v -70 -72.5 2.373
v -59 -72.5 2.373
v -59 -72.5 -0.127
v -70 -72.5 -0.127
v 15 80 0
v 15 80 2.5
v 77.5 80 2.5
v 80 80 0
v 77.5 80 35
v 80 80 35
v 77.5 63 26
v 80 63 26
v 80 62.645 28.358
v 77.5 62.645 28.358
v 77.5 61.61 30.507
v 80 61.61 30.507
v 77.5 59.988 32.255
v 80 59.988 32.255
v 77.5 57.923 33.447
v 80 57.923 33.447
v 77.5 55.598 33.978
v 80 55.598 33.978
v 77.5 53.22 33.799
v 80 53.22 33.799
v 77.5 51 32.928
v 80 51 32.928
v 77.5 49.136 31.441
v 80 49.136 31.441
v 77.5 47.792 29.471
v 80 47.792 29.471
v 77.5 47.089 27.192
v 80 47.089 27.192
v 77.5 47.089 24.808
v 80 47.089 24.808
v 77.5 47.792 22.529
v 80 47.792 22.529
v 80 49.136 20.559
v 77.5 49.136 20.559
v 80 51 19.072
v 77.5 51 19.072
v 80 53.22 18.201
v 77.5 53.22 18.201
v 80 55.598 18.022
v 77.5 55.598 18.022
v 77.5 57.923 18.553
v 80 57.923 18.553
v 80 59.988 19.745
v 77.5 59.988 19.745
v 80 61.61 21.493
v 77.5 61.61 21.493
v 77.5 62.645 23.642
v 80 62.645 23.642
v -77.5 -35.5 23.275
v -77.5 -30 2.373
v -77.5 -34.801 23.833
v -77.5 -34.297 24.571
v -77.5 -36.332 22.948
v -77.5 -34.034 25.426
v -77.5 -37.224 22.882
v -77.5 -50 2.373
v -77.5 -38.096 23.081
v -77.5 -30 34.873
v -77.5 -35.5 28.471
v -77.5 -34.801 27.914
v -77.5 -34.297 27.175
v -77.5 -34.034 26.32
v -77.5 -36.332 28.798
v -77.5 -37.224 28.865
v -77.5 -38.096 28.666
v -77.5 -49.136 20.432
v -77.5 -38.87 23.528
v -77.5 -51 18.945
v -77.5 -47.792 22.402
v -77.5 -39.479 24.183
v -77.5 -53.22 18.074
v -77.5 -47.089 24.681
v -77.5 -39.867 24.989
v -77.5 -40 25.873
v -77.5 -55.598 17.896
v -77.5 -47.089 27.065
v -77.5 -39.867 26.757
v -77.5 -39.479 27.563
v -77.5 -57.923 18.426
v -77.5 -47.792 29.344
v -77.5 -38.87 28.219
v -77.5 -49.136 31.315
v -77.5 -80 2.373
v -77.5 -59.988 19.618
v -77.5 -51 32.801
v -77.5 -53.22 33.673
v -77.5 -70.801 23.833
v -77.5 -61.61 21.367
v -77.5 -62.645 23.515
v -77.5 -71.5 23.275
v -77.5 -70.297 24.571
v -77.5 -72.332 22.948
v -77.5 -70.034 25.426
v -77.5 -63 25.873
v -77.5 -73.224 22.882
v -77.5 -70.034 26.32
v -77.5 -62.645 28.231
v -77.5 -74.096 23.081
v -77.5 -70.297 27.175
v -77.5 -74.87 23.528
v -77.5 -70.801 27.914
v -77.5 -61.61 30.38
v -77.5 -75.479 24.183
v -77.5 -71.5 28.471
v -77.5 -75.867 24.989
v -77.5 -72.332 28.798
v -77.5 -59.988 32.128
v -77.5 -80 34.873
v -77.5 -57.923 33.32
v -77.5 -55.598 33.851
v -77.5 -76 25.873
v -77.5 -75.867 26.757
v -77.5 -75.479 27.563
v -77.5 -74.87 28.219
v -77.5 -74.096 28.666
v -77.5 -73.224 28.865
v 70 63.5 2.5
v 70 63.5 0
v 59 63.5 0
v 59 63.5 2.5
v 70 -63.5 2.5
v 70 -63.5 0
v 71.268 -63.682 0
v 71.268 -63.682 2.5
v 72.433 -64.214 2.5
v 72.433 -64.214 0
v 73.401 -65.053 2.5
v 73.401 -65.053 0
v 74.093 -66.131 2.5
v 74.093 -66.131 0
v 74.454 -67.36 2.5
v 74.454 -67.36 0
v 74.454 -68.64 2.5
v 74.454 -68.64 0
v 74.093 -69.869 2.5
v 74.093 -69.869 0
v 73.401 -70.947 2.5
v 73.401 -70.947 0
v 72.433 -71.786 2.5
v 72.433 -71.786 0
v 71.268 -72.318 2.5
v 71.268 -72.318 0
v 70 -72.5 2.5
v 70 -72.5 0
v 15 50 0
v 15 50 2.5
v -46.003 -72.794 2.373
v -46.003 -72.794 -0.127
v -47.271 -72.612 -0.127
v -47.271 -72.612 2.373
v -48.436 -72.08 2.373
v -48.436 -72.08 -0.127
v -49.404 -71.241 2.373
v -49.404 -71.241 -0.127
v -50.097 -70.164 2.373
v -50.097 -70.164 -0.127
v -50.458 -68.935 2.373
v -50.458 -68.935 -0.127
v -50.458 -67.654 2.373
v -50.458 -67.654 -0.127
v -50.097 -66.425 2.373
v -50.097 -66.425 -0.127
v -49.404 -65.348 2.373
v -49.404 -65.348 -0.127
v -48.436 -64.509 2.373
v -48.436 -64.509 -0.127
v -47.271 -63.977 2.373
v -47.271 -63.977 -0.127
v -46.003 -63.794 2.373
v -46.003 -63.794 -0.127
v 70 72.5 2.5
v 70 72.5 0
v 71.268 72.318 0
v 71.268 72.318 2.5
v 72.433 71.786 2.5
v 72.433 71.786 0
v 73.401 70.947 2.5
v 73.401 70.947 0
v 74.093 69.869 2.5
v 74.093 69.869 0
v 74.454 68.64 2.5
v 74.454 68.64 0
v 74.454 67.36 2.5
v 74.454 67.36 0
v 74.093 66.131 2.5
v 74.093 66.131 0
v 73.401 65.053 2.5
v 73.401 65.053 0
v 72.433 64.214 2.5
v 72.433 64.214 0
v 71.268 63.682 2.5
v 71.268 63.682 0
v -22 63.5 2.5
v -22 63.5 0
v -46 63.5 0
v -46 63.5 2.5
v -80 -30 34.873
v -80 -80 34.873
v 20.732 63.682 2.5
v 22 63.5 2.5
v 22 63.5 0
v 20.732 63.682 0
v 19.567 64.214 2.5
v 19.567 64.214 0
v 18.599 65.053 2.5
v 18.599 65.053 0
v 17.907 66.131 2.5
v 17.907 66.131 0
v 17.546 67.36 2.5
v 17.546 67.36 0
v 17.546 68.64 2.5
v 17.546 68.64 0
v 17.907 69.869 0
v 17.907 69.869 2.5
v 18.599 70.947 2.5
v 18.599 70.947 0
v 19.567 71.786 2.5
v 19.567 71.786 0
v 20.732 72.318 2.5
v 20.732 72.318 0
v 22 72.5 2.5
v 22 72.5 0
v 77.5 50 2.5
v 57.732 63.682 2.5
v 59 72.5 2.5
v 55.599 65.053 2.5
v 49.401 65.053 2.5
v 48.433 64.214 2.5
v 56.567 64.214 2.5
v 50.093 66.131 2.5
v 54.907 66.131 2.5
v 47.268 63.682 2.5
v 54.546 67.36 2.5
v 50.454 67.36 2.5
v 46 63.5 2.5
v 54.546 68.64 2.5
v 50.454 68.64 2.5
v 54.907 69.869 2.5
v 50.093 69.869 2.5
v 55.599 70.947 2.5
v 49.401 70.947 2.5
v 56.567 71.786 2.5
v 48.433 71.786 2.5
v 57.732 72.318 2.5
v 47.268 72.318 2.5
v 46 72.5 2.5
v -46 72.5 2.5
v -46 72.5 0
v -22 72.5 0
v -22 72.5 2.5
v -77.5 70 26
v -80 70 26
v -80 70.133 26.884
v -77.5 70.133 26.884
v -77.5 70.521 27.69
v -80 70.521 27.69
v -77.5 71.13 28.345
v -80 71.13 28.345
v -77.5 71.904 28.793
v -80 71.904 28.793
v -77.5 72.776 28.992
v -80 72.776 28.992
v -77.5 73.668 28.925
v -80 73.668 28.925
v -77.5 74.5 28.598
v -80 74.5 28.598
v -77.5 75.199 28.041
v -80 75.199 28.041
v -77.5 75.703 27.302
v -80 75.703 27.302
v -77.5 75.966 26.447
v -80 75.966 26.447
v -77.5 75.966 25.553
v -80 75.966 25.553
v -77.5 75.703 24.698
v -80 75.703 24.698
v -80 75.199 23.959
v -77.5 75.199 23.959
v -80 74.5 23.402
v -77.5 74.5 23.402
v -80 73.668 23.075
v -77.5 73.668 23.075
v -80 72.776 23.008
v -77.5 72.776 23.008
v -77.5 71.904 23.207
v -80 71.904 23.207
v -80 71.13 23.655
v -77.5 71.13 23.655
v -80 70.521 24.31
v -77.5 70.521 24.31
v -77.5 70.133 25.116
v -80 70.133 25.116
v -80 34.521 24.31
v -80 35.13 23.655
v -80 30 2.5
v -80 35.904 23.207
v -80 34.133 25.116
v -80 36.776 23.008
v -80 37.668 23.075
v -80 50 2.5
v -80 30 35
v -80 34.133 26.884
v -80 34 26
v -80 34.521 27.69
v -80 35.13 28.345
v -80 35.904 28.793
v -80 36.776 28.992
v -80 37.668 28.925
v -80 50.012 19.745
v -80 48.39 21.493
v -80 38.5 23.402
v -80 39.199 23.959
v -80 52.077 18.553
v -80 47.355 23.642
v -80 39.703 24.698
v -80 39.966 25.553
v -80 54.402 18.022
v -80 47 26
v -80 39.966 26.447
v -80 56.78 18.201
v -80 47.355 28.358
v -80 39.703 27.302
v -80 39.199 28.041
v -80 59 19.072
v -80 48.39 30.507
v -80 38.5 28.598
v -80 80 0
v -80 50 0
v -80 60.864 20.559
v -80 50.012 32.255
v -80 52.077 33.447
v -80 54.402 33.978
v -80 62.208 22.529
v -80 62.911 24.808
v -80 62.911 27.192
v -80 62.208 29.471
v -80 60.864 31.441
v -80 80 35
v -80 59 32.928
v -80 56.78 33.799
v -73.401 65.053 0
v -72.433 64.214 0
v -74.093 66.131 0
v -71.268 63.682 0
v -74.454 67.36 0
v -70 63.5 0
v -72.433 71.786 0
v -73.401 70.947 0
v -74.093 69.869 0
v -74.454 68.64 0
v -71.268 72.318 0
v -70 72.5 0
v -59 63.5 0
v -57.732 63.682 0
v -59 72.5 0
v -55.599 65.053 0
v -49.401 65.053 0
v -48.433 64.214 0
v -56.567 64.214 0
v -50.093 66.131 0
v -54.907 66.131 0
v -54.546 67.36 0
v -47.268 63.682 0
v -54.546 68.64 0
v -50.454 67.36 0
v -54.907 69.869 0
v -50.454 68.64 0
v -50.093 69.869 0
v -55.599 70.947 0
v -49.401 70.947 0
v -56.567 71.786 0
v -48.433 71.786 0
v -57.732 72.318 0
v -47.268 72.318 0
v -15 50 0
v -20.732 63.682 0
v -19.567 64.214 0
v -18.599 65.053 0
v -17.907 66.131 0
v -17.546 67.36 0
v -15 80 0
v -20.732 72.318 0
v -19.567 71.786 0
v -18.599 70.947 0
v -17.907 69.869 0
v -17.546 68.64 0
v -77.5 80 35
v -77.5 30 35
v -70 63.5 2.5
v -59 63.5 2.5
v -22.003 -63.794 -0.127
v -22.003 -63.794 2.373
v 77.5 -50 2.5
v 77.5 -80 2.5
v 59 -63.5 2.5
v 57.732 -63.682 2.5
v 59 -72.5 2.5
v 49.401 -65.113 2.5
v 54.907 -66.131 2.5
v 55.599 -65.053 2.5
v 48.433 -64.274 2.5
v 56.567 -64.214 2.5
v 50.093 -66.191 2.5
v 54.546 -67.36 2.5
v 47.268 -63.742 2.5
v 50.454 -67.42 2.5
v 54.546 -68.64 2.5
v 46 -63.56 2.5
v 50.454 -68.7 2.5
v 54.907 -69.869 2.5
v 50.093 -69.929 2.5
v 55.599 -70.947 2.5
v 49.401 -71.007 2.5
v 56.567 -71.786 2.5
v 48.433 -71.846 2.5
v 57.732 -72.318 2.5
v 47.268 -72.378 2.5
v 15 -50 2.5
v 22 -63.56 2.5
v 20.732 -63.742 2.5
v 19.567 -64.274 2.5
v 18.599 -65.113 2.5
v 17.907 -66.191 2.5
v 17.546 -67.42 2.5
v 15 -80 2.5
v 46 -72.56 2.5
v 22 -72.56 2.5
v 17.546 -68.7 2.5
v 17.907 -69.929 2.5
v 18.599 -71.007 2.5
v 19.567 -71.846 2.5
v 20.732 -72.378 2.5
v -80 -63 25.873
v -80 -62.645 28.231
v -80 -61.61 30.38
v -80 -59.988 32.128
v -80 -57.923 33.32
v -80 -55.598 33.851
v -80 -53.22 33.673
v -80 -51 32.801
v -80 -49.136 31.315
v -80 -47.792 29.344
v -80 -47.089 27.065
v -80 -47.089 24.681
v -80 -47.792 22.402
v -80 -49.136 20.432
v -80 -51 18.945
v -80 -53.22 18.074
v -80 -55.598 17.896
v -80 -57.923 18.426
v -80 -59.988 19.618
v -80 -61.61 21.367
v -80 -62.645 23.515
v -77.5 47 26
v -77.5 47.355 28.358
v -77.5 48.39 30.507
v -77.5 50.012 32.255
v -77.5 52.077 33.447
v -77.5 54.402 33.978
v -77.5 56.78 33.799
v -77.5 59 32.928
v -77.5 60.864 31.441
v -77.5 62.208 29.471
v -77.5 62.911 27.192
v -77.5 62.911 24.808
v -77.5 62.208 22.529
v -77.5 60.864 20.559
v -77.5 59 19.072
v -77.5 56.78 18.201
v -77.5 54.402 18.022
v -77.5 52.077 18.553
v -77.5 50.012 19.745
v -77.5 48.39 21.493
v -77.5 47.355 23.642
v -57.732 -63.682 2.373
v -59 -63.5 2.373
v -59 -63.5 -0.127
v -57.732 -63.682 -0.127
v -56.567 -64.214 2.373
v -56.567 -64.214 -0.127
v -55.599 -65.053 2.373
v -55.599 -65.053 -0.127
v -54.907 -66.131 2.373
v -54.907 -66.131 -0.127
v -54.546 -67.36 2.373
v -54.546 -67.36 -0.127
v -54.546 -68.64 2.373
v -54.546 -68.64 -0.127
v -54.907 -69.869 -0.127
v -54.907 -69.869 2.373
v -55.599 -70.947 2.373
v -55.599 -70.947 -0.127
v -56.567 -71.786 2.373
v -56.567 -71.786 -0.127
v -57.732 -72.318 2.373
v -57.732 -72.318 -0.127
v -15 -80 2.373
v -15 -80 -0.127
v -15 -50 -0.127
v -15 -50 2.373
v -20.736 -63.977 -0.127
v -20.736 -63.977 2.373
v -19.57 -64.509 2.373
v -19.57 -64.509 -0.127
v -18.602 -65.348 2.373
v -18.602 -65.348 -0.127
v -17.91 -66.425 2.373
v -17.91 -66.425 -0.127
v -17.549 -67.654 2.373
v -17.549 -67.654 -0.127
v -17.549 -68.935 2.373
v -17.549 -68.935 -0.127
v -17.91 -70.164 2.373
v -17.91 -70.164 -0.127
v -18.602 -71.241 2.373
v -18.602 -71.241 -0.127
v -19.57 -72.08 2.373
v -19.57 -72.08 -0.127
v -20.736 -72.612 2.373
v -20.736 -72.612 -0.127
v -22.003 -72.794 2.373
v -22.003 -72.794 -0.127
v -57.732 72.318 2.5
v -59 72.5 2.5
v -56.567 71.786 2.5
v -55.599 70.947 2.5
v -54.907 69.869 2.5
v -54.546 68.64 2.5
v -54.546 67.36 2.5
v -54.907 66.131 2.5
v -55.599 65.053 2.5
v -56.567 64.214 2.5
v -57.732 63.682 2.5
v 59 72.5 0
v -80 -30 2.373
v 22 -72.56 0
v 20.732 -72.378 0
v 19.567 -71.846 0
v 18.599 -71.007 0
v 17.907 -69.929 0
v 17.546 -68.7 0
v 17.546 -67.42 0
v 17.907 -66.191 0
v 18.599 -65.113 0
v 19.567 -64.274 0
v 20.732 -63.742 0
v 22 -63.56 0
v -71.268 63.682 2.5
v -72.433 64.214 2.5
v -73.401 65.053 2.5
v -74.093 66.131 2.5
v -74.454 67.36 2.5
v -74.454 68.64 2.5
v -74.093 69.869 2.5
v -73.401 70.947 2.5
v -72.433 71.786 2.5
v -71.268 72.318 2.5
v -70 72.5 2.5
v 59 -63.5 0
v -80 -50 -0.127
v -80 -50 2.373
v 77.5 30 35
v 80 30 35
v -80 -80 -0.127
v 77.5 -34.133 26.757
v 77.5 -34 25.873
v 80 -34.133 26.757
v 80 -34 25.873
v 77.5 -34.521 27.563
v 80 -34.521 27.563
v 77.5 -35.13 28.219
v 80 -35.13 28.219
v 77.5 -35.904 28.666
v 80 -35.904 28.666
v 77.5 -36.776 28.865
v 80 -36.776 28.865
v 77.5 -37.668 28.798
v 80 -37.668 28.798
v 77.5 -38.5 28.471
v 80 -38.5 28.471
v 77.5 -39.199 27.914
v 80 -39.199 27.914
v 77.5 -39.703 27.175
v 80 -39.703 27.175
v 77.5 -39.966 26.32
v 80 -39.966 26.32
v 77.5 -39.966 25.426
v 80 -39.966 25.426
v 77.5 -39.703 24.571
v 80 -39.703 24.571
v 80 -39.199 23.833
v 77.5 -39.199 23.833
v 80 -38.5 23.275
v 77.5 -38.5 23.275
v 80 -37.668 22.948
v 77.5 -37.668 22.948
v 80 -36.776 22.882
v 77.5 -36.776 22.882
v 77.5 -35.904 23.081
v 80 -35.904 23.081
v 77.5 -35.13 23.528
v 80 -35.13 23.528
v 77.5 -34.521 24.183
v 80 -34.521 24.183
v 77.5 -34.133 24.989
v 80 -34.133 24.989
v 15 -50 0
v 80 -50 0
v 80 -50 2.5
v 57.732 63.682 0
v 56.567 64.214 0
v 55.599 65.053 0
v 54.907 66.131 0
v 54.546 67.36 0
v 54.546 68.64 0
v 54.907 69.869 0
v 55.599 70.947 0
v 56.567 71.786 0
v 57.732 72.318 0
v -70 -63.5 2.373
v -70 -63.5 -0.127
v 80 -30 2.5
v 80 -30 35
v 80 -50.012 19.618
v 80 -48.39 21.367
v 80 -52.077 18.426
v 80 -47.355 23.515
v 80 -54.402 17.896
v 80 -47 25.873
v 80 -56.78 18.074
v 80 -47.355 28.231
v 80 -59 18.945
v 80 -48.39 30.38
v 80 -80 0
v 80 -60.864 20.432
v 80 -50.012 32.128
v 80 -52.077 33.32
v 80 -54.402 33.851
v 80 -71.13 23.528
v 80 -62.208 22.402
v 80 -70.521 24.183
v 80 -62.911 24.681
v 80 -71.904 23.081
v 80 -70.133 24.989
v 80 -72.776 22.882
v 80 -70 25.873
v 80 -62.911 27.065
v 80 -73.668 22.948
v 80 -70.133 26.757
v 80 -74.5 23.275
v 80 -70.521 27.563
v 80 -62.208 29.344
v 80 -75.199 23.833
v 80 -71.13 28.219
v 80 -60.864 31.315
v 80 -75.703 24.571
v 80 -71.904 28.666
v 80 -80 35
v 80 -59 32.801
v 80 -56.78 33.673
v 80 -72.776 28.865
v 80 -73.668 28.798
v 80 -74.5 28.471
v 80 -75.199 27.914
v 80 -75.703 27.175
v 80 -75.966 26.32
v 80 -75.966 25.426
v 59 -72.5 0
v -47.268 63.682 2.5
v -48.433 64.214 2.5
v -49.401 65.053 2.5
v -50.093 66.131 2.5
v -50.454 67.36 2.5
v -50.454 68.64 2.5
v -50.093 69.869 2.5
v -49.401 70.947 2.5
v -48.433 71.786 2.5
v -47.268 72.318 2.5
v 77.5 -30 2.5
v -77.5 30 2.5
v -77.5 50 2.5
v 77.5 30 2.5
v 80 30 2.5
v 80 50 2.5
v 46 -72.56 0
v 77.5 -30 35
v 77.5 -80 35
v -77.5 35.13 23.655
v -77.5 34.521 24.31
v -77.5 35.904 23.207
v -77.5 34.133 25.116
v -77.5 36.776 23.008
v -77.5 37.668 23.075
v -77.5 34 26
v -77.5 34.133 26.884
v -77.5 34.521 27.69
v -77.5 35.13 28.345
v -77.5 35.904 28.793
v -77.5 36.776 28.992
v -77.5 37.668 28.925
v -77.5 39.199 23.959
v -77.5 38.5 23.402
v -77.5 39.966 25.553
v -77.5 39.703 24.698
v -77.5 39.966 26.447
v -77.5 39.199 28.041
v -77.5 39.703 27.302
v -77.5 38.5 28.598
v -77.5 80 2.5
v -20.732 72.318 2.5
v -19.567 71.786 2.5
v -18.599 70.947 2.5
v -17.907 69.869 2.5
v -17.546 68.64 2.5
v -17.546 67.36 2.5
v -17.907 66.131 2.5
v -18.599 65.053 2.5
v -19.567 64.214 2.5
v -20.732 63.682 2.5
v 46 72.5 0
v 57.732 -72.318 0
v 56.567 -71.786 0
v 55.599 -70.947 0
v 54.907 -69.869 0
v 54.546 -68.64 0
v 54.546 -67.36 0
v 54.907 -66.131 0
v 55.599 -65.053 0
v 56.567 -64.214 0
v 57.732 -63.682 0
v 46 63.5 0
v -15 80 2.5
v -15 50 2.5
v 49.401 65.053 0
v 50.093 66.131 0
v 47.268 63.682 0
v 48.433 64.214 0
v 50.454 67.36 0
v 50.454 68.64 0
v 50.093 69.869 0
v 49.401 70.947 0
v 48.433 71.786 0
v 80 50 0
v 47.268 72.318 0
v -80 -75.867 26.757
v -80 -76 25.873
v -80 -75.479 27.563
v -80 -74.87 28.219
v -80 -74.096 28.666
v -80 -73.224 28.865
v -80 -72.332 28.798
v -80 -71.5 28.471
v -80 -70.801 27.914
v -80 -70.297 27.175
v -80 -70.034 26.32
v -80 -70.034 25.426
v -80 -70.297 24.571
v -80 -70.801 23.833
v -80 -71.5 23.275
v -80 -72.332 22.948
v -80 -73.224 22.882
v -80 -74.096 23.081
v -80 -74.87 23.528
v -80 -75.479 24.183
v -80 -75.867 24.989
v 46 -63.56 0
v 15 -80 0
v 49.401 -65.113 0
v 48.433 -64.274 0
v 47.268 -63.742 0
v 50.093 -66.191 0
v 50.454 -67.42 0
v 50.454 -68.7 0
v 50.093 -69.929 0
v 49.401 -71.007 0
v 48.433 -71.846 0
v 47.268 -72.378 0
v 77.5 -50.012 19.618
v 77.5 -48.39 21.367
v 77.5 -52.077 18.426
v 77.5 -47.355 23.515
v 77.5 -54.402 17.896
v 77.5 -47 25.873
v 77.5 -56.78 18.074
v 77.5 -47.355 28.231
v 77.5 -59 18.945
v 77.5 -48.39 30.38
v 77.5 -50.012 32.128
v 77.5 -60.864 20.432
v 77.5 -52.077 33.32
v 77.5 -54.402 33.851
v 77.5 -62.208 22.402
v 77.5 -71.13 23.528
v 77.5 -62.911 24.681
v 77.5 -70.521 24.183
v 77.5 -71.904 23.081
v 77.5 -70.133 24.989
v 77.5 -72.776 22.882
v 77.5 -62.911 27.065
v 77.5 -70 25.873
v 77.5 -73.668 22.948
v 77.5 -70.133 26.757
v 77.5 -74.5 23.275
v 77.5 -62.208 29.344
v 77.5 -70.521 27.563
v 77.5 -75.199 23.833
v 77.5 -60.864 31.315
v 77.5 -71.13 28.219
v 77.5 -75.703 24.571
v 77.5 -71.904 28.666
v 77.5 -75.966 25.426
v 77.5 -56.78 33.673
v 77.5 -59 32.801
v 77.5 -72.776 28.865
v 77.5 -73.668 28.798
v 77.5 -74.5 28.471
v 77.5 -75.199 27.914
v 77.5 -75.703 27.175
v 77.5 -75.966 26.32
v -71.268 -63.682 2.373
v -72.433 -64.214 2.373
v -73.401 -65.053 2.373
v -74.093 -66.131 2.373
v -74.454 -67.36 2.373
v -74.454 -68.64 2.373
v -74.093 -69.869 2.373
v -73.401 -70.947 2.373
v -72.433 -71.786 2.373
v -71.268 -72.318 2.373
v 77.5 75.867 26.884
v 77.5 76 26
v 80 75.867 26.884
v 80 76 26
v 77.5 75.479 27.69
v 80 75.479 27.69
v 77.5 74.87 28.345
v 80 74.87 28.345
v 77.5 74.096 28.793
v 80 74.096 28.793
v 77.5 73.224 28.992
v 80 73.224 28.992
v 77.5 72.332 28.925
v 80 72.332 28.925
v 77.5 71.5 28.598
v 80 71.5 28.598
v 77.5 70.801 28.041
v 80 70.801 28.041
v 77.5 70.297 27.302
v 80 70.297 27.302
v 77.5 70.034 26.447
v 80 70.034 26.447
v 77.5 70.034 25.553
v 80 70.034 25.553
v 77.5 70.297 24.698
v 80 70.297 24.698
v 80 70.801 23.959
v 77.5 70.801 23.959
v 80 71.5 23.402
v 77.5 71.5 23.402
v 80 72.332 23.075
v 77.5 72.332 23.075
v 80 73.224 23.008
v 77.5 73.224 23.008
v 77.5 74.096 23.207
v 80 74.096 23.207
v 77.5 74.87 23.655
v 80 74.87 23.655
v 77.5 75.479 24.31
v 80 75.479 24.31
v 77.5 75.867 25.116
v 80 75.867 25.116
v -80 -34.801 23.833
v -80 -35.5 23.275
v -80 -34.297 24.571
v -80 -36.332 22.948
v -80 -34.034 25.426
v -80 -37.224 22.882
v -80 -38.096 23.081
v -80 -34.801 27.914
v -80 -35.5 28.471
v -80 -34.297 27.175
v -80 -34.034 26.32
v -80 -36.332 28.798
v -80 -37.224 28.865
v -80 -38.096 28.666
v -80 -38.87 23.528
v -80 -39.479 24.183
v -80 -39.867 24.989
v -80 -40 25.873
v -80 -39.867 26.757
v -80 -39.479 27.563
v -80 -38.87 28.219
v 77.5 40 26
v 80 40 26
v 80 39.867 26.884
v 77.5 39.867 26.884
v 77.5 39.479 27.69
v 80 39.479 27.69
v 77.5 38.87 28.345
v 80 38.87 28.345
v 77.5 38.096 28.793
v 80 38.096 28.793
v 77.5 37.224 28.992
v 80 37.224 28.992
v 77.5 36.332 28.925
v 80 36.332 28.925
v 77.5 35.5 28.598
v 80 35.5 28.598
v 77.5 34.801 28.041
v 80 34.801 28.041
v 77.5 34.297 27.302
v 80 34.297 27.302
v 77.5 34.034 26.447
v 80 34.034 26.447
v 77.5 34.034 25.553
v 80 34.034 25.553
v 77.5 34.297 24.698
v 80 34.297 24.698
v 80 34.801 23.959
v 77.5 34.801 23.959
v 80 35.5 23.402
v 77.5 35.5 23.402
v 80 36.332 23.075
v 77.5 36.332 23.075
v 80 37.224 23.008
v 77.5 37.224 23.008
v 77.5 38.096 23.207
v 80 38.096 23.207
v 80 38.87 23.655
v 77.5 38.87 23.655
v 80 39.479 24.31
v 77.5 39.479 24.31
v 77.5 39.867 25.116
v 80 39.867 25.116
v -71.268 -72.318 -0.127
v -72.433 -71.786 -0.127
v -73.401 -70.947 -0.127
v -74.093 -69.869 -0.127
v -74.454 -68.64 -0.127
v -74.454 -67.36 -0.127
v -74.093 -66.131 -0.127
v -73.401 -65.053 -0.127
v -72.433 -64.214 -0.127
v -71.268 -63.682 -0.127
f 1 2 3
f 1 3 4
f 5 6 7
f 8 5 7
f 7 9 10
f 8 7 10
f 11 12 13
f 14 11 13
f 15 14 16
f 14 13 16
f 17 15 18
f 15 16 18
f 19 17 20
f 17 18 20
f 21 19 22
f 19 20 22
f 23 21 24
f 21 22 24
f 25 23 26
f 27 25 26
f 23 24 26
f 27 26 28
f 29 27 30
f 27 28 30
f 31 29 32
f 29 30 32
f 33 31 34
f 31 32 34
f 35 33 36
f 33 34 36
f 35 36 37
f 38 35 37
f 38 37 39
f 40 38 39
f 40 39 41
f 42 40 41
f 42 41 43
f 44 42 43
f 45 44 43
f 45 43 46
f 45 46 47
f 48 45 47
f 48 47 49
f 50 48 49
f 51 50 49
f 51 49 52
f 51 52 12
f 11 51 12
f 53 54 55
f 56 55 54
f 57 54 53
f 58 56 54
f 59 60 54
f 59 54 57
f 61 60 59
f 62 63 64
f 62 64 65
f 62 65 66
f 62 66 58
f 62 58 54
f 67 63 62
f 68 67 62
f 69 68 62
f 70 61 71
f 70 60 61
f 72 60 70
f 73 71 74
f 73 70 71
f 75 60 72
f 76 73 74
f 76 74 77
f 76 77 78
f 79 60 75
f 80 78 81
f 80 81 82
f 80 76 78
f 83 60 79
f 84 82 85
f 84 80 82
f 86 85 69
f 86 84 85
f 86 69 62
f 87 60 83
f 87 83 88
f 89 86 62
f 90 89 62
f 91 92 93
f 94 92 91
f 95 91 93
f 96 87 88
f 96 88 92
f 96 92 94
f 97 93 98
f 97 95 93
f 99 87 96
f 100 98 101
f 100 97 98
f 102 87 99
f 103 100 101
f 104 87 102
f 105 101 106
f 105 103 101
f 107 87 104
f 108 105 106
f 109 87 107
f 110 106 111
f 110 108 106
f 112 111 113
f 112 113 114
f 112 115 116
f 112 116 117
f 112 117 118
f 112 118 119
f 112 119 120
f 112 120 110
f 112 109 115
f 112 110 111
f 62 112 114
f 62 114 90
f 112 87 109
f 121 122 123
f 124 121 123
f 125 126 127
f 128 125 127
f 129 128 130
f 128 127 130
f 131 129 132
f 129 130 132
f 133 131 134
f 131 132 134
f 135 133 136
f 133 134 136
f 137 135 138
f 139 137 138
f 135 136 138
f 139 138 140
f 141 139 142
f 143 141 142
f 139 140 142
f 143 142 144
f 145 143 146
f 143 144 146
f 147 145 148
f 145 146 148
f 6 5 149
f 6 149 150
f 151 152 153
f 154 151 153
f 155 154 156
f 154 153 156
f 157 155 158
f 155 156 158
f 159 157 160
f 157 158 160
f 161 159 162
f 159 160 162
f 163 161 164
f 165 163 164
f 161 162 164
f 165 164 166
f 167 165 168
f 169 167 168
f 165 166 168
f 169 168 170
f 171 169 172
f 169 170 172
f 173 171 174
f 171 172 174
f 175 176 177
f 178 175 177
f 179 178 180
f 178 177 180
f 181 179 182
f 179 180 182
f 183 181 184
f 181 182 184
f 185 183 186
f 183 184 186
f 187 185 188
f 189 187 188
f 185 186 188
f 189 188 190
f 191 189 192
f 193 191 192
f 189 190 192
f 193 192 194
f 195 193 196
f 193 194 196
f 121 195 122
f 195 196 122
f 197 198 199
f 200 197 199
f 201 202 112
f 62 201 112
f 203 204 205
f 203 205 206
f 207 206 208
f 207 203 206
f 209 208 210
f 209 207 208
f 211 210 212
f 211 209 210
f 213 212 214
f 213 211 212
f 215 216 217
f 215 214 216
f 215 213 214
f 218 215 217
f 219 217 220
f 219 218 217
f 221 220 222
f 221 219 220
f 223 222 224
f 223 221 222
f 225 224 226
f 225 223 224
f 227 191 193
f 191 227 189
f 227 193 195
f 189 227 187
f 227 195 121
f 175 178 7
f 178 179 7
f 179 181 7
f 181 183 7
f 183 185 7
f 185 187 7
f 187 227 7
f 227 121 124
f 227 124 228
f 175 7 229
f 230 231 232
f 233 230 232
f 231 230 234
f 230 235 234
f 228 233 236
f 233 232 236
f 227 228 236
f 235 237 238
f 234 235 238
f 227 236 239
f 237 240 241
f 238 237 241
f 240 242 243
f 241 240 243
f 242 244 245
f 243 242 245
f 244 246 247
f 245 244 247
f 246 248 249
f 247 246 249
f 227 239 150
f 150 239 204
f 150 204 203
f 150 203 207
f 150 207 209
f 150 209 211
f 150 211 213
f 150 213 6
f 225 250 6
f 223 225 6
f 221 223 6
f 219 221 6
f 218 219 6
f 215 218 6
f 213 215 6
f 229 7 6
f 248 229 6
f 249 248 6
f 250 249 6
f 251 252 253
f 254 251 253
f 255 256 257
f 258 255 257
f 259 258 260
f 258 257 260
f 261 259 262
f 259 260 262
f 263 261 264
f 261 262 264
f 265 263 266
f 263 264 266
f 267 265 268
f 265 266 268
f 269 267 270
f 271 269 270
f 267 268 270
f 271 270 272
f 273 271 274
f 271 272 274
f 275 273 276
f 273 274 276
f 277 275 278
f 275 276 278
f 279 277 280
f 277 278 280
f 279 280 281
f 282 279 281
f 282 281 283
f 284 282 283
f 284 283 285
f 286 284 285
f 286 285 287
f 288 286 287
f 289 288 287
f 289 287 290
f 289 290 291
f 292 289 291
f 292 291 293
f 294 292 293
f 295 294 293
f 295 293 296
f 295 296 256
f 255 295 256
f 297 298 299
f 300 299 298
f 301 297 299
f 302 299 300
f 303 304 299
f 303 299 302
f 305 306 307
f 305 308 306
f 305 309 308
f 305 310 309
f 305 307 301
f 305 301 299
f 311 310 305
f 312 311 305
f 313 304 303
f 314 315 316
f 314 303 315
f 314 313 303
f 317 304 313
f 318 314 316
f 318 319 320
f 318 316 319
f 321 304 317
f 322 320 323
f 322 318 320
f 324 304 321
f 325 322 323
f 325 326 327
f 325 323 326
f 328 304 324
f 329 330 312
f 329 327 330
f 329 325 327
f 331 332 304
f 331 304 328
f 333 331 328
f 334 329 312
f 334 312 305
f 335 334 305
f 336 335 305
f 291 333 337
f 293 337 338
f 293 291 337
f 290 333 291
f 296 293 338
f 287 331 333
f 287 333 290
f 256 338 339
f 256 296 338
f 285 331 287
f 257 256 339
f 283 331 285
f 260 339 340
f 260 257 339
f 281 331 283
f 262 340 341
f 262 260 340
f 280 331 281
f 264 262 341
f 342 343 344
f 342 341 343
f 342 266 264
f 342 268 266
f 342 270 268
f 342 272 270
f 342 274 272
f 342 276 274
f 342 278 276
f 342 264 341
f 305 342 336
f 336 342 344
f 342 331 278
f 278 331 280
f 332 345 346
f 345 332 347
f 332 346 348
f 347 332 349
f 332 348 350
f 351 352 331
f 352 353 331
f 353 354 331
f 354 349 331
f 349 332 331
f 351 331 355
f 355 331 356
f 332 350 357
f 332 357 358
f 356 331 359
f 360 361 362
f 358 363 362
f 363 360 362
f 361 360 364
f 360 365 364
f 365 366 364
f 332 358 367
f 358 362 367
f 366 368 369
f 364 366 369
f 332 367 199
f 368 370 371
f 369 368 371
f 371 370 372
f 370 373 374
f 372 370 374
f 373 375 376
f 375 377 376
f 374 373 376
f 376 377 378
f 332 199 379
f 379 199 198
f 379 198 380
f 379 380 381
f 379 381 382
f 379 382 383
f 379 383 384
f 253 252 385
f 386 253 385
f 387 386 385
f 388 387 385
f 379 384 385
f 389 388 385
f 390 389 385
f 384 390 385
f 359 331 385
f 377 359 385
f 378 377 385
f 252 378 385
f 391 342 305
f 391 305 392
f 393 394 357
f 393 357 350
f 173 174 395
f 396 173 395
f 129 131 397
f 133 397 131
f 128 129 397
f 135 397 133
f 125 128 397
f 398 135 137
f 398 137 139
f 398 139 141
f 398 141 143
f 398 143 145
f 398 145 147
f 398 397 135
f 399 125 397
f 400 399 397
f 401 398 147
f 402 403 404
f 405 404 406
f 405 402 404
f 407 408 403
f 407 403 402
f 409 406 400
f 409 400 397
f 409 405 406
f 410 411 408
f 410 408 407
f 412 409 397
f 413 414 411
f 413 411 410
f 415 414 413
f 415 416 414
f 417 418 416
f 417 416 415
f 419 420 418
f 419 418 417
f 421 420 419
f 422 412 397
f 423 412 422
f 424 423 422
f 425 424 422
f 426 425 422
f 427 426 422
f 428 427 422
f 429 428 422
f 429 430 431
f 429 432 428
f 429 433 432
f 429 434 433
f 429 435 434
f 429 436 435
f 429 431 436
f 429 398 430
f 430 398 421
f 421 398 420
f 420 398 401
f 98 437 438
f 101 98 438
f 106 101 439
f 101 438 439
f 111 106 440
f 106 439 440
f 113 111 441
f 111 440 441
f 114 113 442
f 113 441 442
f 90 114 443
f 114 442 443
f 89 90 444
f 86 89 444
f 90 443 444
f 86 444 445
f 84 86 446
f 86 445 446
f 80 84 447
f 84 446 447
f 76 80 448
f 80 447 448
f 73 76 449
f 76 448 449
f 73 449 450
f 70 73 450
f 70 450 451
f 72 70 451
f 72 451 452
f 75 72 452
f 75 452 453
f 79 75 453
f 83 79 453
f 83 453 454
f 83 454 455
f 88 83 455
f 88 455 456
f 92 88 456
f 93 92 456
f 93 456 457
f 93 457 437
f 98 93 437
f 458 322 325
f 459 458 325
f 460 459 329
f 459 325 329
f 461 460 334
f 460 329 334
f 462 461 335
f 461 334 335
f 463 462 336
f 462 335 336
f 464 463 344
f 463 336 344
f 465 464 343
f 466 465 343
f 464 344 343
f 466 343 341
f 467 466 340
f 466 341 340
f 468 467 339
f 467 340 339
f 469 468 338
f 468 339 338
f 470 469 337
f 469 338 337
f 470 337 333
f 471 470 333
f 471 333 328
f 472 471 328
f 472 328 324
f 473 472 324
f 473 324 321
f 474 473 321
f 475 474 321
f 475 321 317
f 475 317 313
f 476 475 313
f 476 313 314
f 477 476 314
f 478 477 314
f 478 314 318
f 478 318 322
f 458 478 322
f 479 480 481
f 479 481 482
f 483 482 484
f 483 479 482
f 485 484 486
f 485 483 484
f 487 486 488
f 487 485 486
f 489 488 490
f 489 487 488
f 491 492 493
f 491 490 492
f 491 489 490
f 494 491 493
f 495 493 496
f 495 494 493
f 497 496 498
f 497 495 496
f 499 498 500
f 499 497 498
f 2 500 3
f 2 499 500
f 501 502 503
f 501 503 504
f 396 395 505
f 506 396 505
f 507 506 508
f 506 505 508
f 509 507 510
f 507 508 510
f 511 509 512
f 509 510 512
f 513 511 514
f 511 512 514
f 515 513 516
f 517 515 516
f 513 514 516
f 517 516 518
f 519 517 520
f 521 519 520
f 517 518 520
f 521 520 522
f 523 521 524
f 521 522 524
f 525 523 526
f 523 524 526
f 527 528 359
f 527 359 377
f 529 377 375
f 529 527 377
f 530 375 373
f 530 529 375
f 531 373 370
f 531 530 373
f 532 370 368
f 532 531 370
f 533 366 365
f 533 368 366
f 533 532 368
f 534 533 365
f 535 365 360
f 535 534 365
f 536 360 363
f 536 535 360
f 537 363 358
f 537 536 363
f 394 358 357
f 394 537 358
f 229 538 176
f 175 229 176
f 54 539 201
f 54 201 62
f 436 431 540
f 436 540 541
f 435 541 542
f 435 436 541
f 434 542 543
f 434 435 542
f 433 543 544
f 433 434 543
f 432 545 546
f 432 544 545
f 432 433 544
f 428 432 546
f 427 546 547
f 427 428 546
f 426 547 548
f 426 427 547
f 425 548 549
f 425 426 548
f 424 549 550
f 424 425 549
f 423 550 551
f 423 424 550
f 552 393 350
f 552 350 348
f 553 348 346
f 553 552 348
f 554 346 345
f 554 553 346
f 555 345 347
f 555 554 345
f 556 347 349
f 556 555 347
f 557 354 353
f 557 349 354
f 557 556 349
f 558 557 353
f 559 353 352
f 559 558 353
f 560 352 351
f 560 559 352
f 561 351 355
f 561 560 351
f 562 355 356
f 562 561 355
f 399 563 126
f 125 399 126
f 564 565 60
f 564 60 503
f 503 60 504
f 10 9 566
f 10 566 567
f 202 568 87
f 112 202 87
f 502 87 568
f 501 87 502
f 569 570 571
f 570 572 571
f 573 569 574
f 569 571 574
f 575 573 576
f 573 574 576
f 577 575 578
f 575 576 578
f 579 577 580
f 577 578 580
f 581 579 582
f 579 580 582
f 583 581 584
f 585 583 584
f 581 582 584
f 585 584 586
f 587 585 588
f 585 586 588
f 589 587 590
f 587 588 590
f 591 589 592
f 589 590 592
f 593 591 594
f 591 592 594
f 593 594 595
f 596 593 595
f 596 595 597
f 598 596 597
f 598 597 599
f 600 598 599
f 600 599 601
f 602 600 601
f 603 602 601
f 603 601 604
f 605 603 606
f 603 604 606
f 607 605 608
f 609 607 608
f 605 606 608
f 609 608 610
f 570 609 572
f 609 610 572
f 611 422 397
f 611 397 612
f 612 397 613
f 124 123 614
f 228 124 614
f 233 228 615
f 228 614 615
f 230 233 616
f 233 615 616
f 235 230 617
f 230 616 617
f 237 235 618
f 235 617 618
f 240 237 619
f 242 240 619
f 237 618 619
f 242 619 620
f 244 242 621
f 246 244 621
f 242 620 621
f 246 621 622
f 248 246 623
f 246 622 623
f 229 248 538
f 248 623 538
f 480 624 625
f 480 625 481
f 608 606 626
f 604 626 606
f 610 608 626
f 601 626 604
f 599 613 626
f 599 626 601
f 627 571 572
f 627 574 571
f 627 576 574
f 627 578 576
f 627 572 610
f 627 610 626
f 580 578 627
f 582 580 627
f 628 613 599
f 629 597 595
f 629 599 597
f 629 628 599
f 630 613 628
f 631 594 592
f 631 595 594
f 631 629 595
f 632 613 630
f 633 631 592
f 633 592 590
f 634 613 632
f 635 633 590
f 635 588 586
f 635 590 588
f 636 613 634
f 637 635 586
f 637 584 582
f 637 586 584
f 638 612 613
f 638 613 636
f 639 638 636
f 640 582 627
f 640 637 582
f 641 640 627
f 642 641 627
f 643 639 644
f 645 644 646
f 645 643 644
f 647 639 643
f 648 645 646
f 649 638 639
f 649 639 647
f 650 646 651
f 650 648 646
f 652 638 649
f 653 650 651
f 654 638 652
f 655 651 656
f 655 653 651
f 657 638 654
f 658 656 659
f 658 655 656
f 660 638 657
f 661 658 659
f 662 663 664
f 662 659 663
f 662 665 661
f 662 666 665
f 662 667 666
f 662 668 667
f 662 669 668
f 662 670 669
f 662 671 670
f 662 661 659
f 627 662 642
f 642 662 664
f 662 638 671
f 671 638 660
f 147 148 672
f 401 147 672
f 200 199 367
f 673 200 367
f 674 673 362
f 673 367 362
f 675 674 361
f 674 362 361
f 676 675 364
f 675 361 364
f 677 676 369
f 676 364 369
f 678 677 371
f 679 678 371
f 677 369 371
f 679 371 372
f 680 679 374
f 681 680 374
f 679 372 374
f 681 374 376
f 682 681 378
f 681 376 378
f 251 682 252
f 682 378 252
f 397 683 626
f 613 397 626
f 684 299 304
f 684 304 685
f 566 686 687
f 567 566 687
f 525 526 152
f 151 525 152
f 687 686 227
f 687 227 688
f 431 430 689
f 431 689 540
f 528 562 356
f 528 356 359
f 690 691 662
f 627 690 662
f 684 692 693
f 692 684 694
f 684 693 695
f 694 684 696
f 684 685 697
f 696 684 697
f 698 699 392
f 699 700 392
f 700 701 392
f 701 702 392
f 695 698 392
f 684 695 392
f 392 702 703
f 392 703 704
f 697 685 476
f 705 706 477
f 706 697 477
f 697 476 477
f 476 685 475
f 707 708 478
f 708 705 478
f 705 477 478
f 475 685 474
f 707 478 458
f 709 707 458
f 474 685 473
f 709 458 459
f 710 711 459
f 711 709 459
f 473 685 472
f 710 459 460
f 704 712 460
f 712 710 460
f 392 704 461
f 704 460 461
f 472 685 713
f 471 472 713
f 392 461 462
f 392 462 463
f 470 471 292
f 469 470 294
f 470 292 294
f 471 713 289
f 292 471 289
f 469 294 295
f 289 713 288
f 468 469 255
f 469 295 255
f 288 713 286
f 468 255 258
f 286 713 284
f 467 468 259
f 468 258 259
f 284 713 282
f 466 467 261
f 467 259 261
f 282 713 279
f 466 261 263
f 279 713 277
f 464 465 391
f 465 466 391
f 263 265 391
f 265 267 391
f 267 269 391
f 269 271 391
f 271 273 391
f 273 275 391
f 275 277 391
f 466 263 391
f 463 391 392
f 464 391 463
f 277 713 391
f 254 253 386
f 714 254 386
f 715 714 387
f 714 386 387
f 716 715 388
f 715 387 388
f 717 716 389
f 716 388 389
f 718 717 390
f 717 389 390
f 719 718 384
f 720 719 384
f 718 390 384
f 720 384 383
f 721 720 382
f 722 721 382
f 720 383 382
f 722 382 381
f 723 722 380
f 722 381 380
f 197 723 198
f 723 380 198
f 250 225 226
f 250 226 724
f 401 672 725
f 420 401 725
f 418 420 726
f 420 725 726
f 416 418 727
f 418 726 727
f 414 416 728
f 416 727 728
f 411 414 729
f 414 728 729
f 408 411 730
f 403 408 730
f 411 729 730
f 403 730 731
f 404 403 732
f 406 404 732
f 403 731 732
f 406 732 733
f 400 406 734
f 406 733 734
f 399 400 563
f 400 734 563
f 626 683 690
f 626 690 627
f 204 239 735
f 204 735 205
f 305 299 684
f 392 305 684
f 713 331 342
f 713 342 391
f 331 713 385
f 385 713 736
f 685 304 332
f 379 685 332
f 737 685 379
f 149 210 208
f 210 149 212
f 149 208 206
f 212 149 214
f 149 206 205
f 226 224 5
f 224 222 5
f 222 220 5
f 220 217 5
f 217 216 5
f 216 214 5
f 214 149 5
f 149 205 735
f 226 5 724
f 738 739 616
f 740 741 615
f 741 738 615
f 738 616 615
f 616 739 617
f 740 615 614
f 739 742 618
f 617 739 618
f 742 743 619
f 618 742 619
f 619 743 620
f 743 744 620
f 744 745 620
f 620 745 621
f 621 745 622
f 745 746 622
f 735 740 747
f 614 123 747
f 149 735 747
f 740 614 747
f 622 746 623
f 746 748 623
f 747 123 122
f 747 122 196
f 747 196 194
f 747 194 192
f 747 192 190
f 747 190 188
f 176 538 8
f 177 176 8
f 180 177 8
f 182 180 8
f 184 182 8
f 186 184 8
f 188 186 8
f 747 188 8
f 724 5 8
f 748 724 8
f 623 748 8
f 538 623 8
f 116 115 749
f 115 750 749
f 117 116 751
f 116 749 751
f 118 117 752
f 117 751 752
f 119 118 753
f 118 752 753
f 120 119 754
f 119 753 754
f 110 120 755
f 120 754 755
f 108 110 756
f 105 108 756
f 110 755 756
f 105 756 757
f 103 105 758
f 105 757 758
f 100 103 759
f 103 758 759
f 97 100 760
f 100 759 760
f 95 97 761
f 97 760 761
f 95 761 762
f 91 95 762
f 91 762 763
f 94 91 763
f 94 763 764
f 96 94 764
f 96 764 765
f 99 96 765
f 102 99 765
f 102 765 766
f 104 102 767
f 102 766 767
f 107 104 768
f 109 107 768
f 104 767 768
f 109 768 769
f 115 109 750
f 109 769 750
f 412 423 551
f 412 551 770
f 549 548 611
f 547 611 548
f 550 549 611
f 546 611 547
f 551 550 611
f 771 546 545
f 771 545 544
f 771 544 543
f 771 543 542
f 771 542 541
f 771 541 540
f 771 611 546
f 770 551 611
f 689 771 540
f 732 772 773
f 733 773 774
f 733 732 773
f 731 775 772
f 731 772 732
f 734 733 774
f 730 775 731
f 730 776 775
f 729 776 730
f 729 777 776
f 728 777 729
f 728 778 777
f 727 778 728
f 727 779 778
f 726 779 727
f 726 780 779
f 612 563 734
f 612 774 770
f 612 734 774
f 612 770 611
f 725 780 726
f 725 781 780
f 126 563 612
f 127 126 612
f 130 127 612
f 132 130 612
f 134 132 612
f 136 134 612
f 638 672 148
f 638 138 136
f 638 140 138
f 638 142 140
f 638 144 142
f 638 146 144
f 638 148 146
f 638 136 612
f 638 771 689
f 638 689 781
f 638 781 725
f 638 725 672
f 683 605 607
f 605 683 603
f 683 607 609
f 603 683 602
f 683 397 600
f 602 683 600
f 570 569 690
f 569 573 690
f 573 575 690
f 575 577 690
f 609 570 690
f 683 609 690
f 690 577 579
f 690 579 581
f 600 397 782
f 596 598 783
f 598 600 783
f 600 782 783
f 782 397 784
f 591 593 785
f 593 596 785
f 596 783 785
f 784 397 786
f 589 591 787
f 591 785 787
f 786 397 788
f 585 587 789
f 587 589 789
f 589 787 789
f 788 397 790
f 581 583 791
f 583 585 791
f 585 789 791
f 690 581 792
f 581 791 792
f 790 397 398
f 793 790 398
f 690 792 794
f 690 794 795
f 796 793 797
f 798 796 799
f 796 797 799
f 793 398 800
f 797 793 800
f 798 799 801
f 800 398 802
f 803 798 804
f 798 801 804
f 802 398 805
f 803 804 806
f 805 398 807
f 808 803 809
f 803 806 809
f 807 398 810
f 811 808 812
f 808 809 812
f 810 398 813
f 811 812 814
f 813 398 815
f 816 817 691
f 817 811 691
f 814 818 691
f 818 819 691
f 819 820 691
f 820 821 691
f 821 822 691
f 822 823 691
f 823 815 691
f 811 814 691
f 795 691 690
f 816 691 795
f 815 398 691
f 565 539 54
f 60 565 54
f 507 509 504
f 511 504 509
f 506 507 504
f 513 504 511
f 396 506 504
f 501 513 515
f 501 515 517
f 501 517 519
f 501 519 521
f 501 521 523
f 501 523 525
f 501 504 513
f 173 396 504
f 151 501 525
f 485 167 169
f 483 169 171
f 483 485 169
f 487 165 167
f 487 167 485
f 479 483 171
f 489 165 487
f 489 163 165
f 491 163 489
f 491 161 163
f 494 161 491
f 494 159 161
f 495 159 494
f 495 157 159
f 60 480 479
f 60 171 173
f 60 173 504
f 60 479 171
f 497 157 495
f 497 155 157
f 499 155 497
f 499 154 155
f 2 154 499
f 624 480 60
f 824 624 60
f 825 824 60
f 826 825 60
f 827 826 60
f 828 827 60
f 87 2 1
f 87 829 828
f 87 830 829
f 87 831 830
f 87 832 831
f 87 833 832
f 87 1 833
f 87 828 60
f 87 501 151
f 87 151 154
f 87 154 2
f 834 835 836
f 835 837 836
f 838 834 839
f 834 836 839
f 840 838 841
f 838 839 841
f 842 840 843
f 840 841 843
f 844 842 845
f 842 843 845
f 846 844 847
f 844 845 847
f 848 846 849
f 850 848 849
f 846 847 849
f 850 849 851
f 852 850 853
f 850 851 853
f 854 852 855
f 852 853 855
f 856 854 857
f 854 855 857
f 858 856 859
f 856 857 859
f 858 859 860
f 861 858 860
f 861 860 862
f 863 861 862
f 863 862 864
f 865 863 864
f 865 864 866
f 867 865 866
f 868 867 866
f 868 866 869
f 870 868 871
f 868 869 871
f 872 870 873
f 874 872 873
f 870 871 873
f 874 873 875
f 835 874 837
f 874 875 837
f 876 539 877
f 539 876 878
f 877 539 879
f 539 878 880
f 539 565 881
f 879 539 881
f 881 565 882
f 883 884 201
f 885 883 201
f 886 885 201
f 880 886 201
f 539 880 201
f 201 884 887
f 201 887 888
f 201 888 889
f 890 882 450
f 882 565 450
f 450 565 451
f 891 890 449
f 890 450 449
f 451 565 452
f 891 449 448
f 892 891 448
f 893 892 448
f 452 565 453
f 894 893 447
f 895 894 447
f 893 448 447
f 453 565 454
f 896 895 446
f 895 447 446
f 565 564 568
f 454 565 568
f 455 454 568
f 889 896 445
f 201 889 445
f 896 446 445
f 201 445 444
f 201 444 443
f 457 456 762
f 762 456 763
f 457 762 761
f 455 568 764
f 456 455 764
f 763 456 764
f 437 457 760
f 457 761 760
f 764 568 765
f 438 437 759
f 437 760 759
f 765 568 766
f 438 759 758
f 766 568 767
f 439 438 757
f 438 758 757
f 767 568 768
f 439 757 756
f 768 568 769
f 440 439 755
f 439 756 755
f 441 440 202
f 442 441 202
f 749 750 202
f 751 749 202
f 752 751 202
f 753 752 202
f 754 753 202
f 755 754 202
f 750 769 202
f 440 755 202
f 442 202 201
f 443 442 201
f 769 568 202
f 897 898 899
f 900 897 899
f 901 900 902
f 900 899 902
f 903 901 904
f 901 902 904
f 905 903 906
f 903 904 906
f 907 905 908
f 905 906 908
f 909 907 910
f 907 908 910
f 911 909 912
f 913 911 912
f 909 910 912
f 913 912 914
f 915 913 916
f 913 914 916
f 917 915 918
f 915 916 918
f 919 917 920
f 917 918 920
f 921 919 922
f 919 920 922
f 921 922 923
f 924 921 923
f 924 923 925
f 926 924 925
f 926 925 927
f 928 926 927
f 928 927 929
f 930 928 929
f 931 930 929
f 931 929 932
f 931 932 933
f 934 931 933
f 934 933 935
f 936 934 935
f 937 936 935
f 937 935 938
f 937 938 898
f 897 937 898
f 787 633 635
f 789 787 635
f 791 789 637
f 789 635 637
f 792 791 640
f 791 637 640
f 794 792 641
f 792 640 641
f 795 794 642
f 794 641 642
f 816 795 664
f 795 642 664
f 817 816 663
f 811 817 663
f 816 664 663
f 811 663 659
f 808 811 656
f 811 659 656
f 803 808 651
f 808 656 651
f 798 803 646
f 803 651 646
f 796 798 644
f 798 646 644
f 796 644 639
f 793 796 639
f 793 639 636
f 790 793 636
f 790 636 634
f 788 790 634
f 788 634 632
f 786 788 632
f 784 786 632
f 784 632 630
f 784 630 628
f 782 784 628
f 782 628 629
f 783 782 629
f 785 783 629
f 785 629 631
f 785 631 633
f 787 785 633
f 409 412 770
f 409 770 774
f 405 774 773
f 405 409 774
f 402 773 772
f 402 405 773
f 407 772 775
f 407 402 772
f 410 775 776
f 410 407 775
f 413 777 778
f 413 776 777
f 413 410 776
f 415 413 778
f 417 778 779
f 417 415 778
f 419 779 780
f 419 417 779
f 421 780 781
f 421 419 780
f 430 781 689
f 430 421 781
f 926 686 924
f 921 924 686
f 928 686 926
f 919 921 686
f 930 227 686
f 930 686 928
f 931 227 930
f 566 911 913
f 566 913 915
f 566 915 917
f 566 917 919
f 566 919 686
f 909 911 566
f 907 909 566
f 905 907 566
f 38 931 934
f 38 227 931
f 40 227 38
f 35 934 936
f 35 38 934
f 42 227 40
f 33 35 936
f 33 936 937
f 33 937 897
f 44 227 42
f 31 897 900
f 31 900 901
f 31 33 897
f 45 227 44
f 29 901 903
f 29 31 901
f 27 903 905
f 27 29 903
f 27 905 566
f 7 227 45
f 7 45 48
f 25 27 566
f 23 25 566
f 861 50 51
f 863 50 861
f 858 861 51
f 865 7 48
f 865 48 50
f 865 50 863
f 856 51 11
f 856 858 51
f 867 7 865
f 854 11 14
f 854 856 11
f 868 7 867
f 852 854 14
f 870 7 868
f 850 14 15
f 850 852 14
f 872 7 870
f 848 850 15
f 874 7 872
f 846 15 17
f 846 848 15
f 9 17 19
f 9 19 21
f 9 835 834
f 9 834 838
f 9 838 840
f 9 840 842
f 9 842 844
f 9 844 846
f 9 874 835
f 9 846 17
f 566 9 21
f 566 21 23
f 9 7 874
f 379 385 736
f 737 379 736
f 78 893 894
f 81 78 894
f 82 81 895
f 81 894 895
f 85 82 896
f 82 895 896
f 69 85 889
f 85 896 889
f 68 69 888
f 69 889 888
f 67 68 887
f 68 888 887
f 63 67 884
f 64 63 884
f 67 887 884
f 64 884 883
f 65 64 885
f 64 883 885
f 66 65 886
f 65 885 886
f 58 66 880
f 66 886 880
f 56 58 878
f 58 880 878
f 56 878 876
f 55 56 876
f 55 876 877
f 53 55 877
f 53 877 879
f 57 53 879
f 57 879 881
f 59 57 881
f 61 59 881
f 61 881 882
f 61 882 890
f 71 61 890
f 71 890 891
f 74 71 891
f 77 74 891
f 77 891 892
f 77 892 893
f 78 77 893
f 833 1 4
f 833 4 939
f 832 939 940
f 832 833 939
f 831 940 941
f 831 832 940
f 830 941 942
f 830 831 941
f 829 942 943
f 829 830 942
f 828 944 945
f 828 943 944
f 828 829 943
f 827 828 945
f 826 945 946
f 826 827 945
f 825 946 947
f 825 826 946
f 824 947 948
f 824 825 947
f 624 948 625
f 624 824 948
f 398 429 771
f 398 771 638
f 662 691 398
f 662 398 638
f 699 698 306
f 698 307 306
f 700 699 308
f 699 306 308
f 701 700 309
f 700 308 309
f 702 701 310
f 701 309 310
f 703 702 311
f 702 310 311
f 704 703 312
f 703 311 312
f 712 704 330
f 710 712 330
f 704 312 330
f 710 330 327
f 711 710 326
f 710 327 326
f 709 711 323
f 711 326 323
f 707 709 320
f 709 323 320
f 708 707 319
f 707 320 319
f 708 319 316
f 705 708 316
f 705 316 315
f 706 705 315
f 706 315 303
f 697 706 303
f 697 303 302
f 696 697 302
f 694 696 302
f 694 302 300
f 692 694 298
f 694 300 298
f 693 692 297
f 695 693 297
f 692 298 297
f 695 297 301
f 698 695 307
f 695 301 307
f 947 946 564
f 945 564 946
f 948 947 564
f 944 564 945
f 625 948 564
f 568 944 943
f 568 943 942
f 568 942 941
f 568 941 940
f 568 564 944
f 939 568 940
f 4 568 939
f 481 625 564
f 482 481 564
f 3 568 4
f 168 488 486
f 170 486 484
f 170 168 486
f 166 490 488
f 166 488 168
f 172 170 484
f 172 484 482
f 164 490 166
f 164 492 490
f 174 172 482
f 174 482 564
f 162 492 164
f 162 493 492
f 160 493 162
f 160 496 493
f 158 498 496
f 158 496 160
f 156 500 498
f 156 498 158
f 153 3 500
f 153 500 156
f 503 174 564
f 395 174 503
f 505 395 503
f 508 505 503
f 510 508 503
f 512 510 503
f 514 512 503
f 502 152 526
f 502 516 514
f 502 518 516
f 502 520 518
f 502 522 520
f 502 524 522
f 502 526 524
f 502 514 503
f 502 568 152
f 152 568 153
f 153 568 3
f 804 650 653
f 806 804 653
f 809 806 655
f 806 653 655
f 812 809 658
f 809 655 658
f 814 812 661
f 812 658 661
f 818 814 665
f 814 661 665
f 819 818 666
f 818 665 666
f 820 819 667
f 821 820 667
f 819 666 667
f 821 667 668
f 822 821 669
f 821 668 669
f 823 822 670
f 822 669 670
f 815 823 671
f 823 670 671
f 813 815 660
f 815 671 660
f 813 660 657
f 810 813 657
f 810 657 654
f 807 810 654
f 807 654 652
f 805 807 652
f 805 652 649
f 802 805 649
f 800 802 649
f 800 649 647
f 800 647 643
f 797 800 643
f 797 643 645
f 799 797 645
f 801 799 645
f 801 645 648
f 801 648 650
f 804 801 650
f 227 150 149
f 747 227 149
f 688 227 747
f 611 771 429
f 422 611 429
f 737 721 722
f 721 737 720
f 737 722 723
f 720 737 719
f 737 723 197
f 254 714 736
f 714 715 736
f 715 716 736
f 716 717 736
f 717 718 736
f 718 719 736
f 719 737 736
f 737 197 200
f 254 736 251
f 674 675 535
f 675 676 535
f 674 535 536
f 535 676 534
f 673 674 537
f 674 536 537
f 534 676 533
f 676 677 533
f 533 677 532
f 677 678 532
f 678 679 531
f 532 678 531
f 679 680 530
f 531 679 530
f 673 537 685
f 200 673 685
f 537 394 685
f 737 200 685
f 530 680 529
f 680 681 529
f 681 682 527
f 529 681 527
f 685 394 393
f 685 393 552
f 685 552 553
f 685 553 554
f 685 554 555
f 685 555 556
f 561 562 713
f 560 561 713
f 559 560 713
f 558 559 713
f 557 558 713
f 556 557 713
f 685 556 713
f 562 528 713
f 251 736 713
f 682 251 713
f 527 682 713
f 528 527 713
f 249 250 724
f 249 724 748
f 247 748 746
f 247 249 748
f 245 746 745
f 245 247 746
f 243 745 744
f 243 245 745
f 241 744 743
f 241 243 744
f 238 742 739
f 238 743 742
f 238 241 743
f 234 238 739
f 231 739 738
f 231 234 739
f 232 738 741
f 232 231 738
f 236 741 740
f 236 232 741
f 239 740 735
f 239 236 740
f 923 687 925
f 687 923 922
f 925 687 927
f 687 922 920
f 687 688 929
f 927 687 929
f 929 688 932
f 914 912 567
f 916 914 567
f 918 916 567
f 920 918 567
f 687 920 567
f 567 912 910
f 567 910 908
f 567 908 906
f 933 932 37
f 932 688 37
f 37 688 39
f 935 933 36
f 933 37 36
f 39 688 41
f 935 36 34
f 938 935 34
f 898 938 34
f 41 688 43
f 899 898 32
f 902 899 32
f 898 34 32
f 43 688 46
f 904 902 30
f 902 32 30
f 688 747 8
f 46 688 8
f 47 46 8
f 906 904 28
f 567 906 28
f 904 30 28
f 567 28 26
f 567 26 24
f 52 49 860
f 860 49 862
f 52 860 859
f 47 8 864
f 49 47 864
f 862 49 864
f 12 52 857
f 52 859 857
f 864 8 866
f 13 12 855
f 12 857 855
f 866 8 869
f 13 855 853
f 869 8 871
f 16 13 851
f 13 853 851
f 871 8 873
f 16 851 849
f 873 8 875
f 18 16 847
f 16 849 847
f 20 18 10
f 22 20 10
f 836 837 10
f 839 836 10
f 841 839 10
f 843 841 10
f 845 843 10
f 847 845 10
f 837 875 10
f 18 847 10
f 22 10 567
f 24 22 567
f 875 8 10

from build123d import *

# Parameters (mm, degrees)
F2_W      = 62.5
F2_H      = 2.5
F2_W_2    = 2.5
F3_DEPTH  = 30
F2_H_2    = 32.5
F4_DEPTH  = 50
F5_R      = 3
F5_R_2    = 8
F7_DEPTH  = 5
F8_DEPTH  = 5
F9_W      = 62.5
F9_H      = 2.5
F9_W_2    = 2.5
F10_DEPTH = 30
F9_H_2    = 32.5
F11_DEPTH = 50
F12_R     = 3
F12_R_2   = 8
F14_DEPTH = 5
F15_DEPTH = 5
F16_W     = 62.5
F16_H     = 2.5
F16_W_2   = 2.5
F17_DEPTH = 30
F16_H_2   = 32.5
F18_DEPTH = 50
F19_R     = 3
F19_R_2   = 8
F21_DEPTH = 5
F22_DEPTH = 5
F23_W     = 62.5
F23_H     = 2.5
F23_W_2   = 2.5
F24_DEPTH = 30
F23_H_2   = 32.5
F25_DEPTH = 50
F26_R     = 3
F26_R_2   = 8
F28_DEPTH = 5
F29_DEPTH = 5


with BuildPart() as f3:
    # F2 (on offset) → F3 (new body)
    with BuildSketch(Plane.XZ.offset(80)):
        with Locations((-46.25, 1.123145)):
            Rectangle(F2_W, F2_H)
        with Locations((-78.75, 1.123145)):
            Rectangle(F2_W_2, F2_H)
    extrude(amount=-F3_DEPTH)

    # F2 (on offset) → F4 (join)
    with BuildSketch(Plane.XZ.offset(80)):
        with Locations((-78.75, 18.623145)):
            Rectangle(F2_W_2, F2_H_2)
    extrude(amount=-F4_DEPTH)

    # F5 (on face) → F7 (cut, symmetric)
    with BuildSketch(Plane(origin=(-80, 0, 0), x_dir=(0, -1, 0), z_dir=(-1, 0, 0))):
        with Locations((37, 25.873145)):
            Circle(F5_R)
        with Locations((55, 25.873145)):
            Circle(F5_R_2)
        with Locations((73, 25.873145)):
            Circle(F5_R)
    extrude(amount=F7_DEPTH, both=True, mode=Mode.SUBTRACT)

    # F6 (on face) → F8 (cut, symmetric)
    with BuildSketch(Plane(origin=(0, 0, -0.126855), x_dir=(1, 0, 0), z_dir=(0, 0, -1))):
        with BuildLine():
            Line((-59, 72.5), (-70, 72.5))
            ThreePointArc((-70, 72.5), (-74.5, 68), (-70, 63.5))
            Line((-70, 63.5), (-59, 63.5))
            ThreePointArc((-59, 63.5), (-54.5, 68), (-59, 72.5))
        make_face()
        with BuildLine():
            Line((-22.003335, 72.794459), (-46.003335, 72.794459))
            ThreePointArc((-46.003335, 72.794459), (-50.503335, 68.294459), (-46.003335, 63.794459))
            Line((-46.003335, 63.794459), (-22.003335, 63.794459))
            ThreePointArc((-22.003335, 63.794459), (-17.503335, 68.294459), (-22.003335, 72.794459))
        make_face()
    extrude(amount=F8_DEPTH, both=True, mode=Mode.SUBTRACT)


with BuildPart() as f10:
    # F9 (on offset) → F10 (new body)
    with BuildSketch(Plane.XZ.offset(80)):
        with Locations((46.25, 1.25)):
            Rectangle(F9_W, F9_H)
        with Locations((78.75, 1.25)):
            Rectangle(F9_W_2, F9_H)
    extrude(amount=-F10_DEPTH)

    # F9 (on offset) → F11 (join)
    with BuildSketch(Plane.XZ.offset(80)):
        with Locations((78.75, 18.75)):
            Rectangle(F9_W_2, F9_H_2)
    extrude(amount=-F11_DEPTH)

    # F12 (on face) → F14 (cut, symmetric)
    with BuildSketch(Plane.YZ.offset(80)):
        with Locations((-73, 25.873145)):
            Circle(F12_R)
        with Locations((-55, 25.873145)):
            Circle(F12_R_2)
        with Locations((-37, 25.873145)):
            Circle(F12_R)
    extrude(amount=F14_DEPTH, both=True, mode=Mode.SUBTRACT)

    # F13 (on face) → F15 (cut, symmetric)
    with BuildSketch(Plane(origin=(0, 0, 0), x_dir=(1, 0, 0), z_dir=(0, 0, -1))):
        with BuildLine():
            Line((46.000139, 72.56005), (22.000139, 72.56005))
            ThreePointArc((22.000139, 72.56005), (17.500139, 68.06005), (22.000139, 63.56005))
            Line((22.000139, 63.56005), (46.000139, 63.56005))
            ThreePointArc((46.000139, 63.56005), (50.500139, 68.06005), (46.000139, 72.56005))
        make_face()
        with BuildLine():
            Line((70, 72.5), (59, 72.5))
            ThreePointArc((59, 72.5), (54.5, 68), (59, 63.5))
            Line((59, 63.5), (70, 63.5))
            ThreePointArc((70, 63.5), (74.5, 68), (70, 72.5))
        make_face()
    extrude(amount=F15_DEPTH, both=True, mode=Mode.SUBTRACT)


with BuildPart() as f17:
    # F16 (on offset) → F17 (new body)
    with BuildSketch(Plane.XZ.offset(-80)):
        with Locations((-46.25, 1.25)):
            Rectangle(F16_W, F16_H)
        with Locations((-78.75, 1.25)):
            Rectangle(F16_W_2, F16_H)
    extrude(amount=F17_DEPTH)

    # F16 (on offset) → F18 (join)
    with BuildSketch(Plane.XZ.offset(-80)):
        with Locations((-78.75, 18.75)):
            Rectangle(F16_W_2, F16_H_2)
    extrude(amount=F18_DEPTH)

    # F19 (on face) → F21 (cut, symmetric)
    with BuildSketch(Plane(origin=(-80, 0, 0), x_dir=(0, -1, 0), z_dir=(-1, 0, 0))):
        with Locations((-73, 26)):
            Circle(F19_R)
        with Locations((-55, 26)):
            Circle(F19_R_2)
        with Locations((-37, 26)):
            Circle(F19_R)
    extrude(amount=F21_DEPTH, both=True, mode=Mode.SUBTRACT)

    # F20 (on face) → F22 (cut, symmetric)
    with BuildSketch(Plane(origin=(0, 0, 0), x_dir=(1, 0, 0), z_dir=(0, 0, -1))):
        with BuildLine():
            Line((-59, -63.5), (-70, -63.5))
            ThreePointArc((-70, -63.5), (-74.5, -68), (-70, -72.5))
            Line((-70, -72.5), (-59, -72.5))
            ThreePointArc((-59, -72.5), (-54.5, -68), (-59, -63.5))
        make_face()
        with BuildLine():
            Line((-22, -63.5), (-46, -63.5))
            ThreePointArc((-46, -63.5), (-50.5, -68), (-46, -72.5))
            Line((-46, -72.5), (-22, -72.5))
            ThreePointArc((-22, -72.5), (-17.5, -68), (-22, -63.5))
        make_face()
    extrude(amount=F22_DEPTH, both=True, mode=Mode.SUBTRACT)


with BuildPart() as f24:
    # F23 (on offset) → F24 (new body)
    with BuildSketch(Plane.XZ.offset(-80)):
        with Locations((46.25, 1.25)):
            Rectangle(F23_W, F23_H)
        with Locations((78.75, 1.25)):
            Rectangle(F23_W_2, F23_H)
    extrude(amount=F24_DEPTH)

    # F23 (on offset) → F25 (join)
    with BuildSketch(Plane.XZ.offset(-80)):
        with Locations((78.75, 18.75)):
            Rectangle(F23_W_2, F23_H_2)
    extrude(amount=F25_DEPTH)

    # F26 (on face) → F28 (cut, symmetric)
    with BuildSketch(Plane.YZ.offset(80)):
        with Locations((37, 26)):
            Circle(F26_R)
        with Locations((55, 26)):
            Circle(F26_R_2)
        with Locations((73, 26)):
            Circle(F26_R)
    extrude(amount=F28_DEPTH, both=True, mode=Mode.SUBTRACT)

    # F27 (on face) → F29 (cut, symmetric)
    with BuildSketch(Plane(origin=(0, 0, 0), x_dir=(1, 0, 0), z_dir=(0, 0, -1))):
        with BuildLine():
            Line((22, -72.5), (46, -72.5))
            ThreePointArc((46, -72.5), (50.5, -68), (46, -63.5))
            Line((46, -63.5), (22, -63.5))
            ThreePointArc((22, -63.5), (17.5, -68), (22, -72.5))
        make_face()
        with BuildLine():
            Line((59, -72.5), (70, -72.5))
            ThreePointArc((70, -72.5), (74.5, -68), (70, -63.5))
            Line((70, -63.5), (59, -63.5))
            ThreePointArc((59, -63.5), (54.5, -68), (59, -72.5))
        make_face()
    extrude(amount=F29_DEPTH, both=True, mode=Mode.SUBTRACT)


solid = Compound([f3.part, f10.part, f17.part, f24.part])
